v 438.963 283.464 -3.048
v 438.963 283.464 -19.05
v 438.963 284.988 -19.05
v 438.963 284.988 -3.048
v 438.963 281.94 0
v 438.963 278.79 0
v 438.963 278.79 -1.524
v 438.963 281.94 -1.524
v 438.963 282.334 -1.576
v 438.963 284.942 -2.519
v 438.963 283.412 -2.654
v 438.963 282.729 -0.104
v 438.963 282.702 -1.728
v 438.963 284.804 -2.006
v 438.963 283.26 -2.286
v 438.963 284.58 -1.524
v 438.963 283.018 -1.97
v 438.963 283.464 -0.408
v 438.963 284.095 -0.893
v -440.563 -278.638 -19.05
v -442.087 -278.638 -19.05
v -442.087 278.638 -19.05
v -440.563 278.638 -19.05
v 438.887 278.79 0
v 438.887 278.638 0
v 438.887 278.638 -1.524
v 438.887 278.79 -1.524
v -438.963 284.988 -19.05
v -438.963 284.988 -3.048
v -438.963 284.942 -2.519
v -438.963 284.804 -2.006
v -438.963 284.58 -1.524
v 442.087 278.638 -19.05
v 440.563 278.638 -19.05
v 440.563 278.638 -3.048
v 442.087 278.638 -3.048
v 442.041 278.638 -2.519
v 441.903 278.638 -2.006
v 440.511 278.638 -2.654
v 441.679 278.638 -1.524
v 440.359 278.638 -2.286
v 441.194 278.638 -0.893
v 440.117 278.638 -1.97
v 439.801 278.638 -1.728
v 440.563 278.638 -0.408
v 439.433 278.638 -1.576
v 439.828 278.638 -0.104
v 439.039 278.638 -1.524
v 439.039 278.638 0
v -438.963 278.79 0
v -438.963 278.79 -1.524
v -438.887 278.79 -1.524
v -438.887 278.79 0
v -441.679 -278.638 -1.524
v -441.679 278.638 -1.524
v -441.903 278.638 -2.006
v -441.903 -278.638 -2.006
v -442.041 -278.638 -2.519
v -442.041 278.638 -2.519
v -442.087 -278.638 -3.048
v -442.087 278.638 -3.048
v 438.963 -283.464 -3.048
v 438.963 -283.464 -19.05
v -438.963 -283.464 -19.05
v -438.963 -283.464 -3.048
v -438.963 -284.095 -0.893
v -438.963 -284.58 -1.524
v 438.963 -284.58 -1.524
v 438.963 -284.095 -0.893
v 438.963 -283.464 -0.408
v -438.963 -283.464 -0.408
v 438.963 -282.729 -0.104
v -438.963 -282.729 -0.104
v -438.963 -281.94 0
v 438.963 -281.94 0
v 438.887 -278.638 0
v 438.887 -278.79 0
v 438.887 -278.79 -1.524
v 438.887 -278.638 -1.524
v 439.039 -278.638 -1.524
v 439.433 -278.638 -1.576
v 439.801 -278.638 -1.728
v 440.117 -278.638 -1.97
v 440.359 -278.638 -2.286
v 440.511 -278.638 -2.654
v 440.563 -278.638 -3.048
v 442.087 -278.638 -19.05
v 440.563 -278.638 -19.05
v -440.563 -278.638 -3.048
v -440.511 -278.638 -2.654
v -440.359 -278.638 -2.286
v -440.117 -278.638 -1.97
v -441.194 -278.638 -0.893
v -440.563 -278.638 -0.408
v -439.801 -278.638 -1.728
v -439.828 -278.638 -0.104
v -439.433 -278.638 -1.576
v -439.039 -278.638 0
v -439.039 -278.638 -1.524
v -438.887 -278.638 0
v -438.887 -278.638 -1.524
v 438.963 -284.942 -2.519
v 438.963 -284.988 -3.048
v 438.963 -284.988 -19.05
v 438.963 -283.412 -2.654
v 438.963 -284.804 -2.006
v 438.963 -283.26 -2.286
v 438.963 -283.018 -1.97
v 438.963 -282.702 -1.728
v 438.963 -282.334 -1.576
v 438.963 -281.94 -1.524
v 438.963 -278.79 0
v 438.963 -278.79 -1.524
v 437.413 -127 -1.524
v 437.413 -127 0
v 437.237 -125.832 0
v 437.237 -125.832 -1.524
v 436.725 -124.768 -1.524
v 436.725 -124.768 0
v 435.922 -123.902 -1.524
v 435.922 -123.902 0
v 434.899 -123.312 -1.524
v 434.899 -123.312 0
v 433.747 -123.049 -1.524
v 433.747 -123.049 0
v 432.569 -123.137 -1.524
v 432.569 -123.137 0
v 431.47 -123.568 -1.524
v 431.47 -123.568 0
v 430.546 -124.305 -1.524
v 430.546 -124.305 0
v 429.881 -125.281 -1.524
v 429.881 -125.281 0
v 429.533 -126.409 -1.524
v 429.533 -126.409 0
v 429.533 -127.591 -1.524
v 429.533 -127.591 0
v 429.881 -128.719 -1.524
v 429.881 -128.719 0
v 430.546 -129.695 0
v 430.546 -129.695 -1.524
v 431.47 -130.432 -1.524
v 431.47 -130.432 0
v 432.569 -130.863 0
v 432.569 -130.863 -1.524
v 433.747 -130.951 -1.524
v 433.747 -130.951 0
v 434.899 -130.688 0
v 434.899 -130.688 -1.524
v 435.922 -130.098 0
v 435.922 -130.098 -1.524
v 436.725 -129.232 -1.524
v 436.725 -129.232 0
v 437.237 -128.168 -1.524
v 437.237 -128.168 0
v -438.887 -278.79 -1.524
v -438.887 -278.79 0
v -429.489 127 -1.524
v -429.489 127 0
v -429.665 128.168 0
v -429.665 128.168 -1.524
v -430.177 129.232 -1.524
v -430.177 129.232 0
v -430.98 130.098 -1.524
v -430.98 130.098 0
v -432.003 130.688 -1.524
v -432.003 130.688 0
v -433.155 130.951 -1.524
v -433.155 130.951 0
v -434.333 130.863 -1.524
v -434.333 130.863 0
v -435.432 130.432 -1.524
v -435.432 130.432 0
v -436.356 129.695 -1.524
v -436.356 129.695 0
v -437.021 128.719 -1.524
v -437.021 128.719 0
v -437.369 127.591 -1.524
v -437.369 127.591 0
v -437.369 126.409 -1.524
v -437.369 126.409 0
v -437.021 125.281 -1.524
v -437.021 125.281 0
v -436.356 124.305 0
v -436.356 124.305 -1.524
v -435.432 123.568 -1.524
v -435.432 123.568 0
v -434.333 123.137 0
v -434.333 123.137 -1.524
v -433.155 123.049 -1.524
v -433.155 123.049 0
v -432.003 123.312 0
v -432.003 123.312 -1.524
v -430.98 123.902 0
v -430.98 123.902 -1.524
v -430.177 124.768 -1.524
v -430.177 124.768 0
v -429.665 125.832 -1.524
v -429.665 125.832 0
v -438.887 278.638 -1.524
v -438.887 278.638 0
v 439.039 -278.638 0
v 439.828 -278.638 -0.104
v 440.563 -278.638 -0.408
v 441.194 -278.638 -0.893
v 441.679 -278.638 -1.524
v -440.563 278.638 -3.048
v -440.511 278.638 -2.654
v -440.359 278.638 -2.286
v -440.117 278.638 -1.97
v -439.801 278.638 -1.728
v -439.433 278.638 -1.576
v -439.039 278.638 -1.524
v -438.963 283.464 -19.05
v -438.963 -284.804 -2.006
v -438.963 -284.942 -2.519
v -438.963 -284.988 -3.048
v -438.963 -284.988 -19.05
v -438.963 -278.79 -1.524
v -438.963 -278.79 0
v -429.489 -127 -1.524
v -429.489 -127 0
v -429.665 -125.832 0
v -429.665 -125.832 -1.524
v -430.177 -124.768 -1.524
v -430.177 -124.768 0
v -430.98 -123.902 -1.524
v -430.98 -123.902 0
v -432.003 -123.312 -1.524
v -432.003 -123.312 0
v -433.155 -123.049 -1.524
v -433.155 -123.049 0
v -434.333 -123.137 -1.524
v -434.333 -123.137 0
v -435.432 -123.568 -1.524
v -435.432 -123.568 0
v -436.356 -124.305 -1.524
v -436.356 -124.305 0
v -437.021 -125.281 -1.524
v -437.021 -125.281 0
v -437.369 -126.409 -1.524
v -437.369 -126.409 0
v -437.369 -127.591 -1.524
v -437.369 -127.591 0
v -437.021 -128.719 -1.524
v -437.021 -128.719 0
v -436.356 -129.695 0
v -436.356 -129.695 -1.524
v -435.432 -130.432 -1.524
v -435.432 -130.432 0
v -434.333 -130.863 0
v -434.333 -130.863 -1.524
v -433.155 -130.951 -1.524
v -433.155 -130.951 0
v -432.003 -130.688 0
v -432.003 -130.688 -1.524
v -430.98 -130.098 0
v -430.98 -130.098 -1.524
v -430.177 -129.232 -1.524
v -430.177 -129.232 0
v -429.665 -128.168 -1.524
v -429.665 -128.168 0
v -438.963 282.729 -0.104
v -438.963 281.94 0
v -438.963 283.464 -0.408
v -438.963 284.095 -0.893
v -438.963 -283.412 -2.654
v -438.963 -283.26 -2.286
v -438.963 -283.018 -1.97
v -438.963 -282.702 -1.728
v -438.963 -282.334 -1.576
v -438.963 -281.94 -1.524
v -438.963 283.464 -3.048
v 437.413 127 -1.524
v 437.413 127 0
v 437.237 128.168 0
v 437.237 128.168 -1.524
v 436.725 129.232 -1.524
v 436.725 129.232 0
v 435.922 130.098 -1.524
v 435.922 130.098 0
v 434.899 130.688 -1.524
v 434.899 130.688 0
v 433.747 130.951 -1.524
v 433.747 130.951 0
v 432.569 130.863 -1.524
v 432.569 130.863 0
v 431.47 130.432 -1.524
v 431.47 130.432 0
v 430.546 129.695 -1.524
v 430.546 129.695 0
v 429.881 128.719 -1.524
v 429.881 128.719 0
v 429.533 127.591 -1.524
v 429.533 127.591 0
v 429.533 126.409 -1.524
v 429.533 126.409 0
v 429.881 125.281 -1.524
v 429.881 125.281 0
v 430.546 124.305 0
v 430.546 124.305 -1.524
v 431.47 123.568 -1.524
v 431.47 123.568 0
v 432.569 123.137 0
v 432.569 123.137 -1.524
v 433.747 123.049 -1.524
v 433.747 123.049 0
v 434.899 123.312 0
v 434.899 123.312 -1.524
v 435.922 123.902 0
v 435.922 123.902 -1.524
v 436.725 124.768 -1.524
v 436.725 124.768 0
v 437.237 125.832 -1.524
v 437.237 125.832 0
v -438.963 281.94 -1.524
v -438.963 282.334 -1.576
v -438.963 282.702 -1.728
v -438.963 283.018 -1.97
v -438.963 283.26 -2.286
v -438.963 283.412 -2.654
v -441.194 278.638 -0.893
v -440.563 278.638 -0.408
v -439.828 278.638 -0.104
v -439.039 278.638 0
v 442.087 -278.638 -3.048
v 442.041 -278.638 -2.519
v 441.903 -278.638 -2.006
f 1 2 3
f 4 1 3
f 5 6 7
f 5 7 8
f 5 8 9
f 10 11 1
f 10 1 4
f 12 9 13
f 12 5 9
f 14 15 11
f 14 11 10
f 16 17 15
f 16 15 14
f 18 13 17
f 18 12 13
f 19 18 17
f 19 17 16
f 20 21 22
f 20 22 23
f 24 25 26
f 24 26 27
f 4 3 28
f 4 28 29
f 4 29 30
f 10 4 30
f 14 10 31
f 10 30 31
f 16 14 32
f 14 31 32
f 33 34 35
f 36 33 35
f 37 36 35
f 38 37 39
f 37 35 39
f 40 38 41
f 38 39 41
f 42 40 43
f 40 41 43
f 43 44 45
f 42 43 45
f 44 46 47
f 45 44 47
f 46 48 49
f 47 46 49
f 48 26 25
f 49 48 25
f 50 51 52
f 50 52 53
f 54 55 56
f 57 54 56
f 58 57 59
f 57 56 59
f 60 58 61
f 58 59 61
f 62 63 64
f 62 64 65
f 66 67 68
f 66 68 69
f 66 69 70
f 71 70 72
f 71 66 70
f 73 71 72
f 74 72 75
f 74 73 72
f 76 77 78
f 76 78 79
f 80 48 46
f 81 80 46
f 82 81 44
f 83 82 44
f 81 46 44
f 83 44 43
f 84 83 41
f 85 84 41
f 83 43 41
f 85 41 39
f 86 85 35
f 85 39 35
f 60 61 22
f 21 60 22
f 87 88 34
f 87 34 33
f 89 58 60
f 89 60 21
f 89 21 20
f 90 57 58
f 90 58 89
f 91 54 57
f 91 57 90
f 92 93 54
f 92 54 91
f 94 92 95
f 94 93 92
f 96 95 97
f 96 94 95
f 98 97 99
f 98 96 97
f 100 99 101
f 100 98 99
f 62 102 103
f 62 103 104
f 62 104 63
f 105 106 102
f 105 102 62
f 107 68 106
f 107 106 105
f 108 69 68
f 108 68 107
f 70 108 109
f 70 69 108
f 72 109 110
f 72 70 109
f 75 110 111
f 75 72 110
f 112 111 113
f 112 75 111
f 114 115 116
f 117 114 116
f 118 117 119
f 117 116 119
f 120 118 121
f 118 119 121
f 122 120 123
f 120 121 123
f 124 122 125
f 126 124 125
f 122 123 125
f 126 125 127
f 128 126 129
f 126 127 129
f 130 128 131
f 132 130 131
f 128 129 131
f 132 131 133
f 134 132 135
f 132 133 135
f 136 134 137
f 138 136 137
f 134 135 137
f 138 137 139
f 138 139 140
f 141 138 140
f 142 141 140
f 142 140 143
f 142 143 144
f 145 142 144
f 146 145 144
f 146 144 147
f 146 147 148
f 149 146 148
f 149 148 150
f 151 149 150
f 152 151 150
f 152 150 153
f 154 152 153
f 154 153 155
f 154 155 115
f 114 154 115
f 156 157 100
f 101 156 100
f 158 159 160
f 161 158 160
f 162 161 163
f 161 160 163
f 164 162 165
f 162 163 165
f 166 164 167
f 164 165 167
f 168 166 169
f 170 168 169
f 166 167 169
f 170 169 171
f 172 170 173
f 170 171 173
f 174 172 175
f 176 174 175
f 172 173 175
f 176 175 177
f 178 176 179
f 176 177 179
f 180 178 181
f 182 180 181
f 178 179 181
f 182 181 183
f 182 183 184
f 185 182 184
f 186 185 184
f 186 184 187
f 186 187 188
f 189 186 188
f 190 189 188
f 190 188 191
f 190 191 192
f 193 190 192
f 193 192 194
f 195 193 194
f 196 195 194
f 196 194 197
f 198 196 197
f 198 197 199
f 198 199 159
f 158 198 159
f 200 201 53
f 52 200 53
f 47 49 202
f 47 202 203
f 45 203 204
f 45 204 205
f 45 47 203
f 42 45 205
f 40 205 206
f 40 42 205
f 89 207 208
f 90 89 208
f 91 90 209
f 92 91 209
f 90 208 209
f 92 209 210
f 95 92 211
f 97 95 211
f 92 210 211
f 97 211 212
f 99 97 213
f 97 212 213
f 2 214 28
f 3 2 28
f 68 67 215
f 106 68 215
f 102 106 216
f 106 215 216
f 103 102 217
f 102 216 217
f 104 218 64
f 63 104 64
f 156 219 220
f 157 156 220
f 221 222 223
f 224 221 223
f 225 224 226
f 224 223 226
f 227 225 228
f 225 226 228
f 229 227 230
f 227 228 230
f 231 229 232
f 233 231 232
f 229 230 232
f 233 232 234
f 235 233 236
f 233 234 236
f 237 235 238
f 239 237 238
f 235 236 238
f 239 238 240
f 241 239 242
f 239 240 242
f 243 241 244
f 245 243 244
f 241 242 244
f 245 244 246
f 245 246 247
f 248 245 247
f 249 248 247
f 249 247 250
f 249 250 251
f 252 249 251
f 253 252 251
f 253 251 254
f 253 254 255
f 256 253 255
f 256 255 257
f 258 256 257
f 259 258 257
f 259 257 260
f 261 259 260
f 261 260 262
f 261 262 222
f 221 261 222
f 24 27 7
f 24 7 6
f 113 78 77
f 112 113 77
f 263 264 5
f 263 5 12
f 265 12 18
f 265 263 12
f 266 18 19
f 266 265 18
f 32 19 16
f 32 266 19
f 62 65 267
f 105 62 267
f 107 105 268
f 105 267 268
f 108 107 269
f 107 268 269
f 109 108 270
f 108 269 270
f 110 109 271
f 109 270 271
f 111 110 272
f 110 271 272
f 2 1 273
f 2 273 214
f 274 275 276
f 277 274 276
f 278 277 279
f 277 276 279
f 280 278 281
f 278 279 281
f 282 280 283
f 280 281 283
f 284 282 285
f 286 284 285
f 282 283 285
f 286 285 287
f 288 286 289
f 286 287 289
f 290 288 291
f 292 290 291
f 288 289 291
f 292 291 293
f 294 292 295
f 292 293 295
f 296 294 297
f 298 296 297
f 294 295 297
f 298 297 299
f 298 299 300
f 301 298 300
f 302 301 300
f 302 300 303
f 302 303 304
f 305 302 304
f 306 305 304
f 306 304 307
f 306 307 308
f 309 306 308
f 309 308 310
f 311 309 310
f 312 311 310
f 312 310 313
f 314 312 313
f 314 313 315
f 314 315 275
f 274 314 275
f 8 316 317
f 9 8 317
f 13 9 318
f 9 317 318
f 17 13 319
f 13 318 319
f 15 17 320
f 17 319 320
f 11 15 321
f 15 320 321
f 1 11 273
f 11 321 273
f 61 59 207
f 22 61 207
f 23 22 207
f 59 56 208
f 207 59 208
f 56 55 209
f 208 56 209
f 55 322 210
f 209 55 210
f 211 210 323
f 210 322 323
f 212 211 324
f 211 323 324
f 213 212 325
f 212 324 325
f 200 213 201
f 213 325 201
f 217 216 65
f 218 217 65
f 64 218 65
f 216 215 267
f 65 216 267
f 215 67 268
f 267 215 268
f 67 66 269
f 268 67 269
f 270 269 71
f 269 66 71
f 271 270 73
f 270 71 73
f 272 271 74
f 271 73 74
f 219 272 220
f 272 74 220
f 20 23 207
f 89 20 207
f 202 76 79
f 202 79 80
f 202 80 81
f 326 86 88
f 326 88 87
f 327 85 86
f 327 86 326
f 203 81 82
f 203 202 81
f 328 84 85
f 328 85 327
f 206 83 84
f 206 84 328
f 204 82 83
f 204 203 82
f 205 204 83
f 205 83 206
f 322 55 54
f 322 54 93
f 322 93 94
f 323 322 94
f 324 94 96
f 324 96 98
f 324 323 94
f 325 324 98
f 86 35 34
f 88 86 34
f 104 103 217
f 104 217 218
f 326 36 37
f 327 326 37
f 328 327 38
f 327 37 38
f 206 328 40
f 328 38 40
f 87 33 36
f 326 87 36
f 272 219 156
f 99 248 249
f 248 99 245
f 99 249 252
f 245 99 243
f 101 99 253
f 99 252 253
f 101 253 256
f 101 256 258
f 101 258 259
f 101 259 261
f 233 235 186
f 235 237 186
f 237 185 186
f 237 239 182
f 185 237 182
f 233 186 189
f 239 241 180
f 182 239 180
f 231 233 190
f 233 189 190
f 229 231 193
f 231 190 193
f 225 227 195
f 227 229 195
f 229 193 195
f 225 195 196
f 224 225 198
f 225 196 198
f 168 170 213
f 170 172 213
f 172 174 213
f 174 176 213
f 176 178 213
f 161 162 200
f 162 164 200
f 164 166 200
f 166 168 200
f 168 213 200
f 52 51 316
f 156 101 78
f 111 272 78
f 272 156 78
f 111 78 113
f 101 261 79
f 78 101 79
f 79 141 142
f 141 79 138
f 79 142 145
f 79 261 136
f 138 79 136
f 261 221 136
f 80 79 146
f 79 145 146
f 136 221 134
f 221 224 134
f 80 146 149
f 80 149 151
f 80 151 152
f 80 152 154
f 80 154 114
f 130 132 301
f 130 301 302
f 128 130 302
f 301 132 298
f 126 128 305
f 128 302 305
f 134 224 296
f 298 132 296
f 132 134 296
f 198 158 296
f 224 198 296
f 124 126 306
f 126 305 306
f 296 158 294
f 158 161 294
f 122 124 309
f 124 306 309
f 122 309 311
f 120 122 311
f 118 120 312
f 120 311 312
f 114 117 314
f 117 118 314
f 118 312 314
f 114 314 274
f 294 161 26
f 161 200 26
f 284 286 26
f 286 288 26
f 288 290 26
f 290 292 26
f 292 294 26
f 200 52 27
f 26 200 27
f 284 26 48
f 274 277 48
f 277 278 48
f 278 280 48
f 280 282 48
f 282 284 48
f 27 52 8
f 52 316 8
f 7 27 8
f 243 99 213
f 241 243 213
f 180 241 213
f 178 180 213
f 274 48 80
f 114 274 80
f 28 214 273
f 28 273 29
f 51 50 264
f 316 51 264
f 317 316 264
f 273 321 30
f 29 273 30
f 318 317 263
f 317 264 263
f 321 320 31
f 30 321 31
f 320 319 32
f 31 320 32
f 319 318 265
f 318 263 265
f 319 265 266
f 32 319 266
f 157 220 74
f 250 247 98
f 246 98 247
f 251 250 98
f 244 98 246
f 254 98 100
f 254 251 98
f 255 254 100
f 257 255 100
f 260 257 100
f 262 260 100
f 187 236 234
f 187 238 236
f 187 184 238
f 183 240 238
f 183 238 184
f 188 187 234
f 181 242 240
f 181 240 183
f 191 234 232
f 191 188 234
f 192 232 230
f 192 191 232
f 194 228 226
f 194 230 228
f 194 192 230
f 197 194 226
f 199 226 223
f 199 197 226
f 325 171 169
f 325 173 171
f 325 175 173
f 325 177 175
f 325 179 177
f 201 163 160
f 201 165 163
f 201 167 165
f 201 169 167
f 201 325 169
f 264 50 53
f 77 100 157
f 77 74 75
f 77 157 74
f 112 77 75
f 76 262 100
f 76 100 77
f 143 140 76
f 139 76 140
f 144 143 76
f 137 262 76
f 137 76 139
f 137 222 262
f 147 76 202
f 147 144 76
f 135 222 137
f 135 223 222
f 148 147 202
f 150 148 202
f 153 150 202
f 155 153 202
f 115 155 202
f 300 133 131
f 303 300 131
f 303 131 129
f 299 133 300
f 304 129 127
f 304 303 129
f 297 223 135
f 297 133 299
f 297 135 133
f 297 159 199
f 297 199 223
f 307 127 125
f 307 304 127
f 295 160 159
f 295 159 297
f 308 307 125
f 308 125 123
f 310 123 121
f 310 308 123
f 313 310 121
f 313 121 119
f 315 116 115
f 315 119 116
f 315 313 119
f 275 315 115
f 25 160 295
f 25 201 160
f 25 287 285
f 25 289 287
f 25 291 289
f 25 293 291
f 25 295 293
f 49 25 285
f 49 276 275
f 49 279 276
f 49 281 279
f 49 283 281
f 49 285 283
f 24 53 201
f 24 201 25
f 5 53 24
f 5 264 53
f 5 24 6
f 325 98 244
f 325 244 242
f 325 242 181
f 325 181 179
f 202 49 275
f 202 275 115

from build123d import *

# Parameters (mm, degrees)
CROQUIS1_W                   = 884.174
CROQUIS1_H                   = 569.976
BRIDA_BASE1_DEPTH            = 1.524
CROQUIS6_W                   = 3.1242
CROQUIS6_H                   = 6.35
CORTAR_EXTRUIR1_DEPTH        = 526.986119863
BRIDA_START                  = -438.9628
BRIDA_DE_ARISTA1_DEPTH       = 877.9256
BRIDA_START_2                = 6.35
BRIDA_DE_ARISTA1_2_DEPTH     = 557.276
BRIDA_DE_ARISTA1_3_DEPTH     = 877.9256
BRIDA_DE_ARISTA1_4_OUTLINE_W = 0.1524
BRIDA_DE_ARISTA1_4_OUTLINE_H = 1.524
BRIDA_DE_ARISTA1_4_DEPTH     = 0.0762
BRIDA_START_3                = 438.8866
BRIDA_DE_ARISTA1_5_OUTLINE_W = 0.1524
BRIDA_DE_ARISTA1_5_OUTLINE_H = 1.524
BRIDA_DE_ARISTA1_5_DEPTH     = 0.0762
BRIDA_DE_ARISTA1_6_DEPTH     = 557.276
CROQUIS19_R                  = 3.9624
CORTAR_EXTRUIR2_DEPTH        = 527.328773879


# Read off the part's stored shape, not the designer's step: Brida de arista1
# Sheet-metal steps are written as plain solids
with BuildPart() as part:
    # Croquis1 → Brida base1 (new body)
    with BuildSketch(Plane.XY):
        Rectangle(CROQUIS1_W, CROQUIS1_H)
    extrude(amount=-BRIDA_BASE1_DEPTH)

    # Croquis6 → Cortar-Extruir1 (cut, through all)
    with BuildSketch(Plane.XY):
        with Locations((440.5249, 281.813)):
            Rectangle(CROQUIS6_W, CROQUIS6_H)
        with Locations((-440.5249, 281.813)):
            Rectangle(CROQUIS6_W, CROQUIS6_H)
        with Locations((-440.5249, -281.813)):
            Rectangle(CROQUIS6_W, CROQUIS6_H)
        with Locations((440.5249, -281.813)):
            Rectangle(CROQUIS6_W, CROQUIS6_H)
    extrude(amount=-CORTAR_EXTRUIR1_DEPTH, mode=Mode.SUBTRACT)

    # Brida de arista1 outline → Brida de arista1 (add)
    with BuildSketch(Plane.YZ.offset(BRIDA_START)):
        with BuildLine():
            Line((284.988, -19.05), (284.988, -3.048))
            ThreePointArc((284.988, -3.048), (284.884141918, -2.259119551), (284.579645431, -1.524))
            Line((284.579645431, -1.524), (281.94, -1.524))
            ThreePointArc((281.94, -1.524), (283.017630735, -1.970369265), (283.464, -3.048))
            Line((283.464, -3.048), (283.464, -19.05))
            Line((283.464, -19.05), (284.988, -19.05))
        make_face()
        with BuildLine():
            ThreePointArc((-283.464, -3.048), (-283.017630735, -1.970369265), (-281.94, -1.524))
            Line((-281.94, -1.524), (-284.579645431, -1.524))
            ThreePointArc((-284.579645431, -1.524), (-284.884141918, -2.259119551), (-284.988, -3.048))
            Line((-284.988, -3.048), (-284.988, -19.05))
            Line((-284.988, -19.05), (-283.464, -19.05))
            Line((-283.464, -19.05), (-283.464, -3.048))
        make_face()
    extrude(amount=BRIDA_DE_ARISTA1_DEPTH)

    # Brida de arista1 2 outline → Brida de arista1 2 (add)
    with BuildSketch(Plane(origin=(0, 284.988, -1.524), x_dir=(-1, 0, 0), z_dir=(0, -1, 0)).offset(BRIDA_START_2)):
        with BuildLine():
            Line((-440.563, 1.524), (-440.563, 17.526))
            Line((-440.563, 17.526), (-442.087, 17.526))
            Line((-442.087, 17.526), (-442.087, 1.524))
            ThreePointArc((-442.087, 1.524), (-441.983141918, 0.735119551), (-441.678645431, 0))
            Line((-441.678645431, 0), (-439.039, 0))
            ThreePointArc((-439.039, 0), (-440.116630735, 0.446369265), (-440.563, 1.524))
        make_face()
        with BuildLine():
            ThreePointArc((440.563, 1.524), (440.116630735, 0.446369265), (439.039, 0))
            Line((439.039, 0), (441.678645431, 0))
            ThreePointArc((441.678645431, 0), (441.983141918, 0.735119551), (442.087, 1.524))
            Line((442.087, 1.524), (442.087, 17.526))
            Line((442.087, 17.526), (440.563, 17.526))
            Line((440.563, 17.526), (440.563, 1.524))
        make_face()
    extrude(amount=BRIDA_DE_ARISTA1_2_DEPTH)

    # Brida de arista1 3 outline → Brida de arista1 3 (cut)
    with BuildSketch(Plane.YZ.offset(BRIDA_START)):
        with BuildLine():
            ThreePointArc((281.94, 0), (283.464, -0.408354569), (284.579645431, -1.524))
            Line((284.579645431, -1.524), (284.988, -1.524))
            Line((284.988, -1.524), (284.988, 0))
            Line((284.988, 0), (281.94, 0))
        make_face()
        with BuildLine():
            ThreePointArc((-284.579645431, -1.524), (-283.464, -0.408354569), (-281.94, 0))
            Line((-281.94, 0), (-284.988, 0))
            Line((-284.988, 0), (-284.988, -1.524))
            Line((-284.988, -1.524), (-284.579645431, -1.524))
        make_face()
    extrude(amount=BRIDA_DE_ARISTA1_3_DEPTH, mode=Mode.SUBTRACT)

    # Brida de arista1 4 outline → Brida de arista1 4 (cut)
    with BuildSketch(Plane.YZ.offset(BRIDA_START)):
        with Locations((278.7142, -0.762)):
            Rectangle(BRIDA_DE_ARISTA1_4_OUTLINE_W, BRIDA_DE_ARISTA1_4_OUTLINE_H)
        with Locations((-278.7142, -0.762)):
            Rectangle(BRIDA_DE_ARISTA1_4_OUTLINE_W, BRIDA_DE_ARISTA1_4_OUTLINE_H)
    extrude(amount=BRIDA_DE_ARISTA1_4_DEPTH, mode=Mode.SUBTRACT)

    # Brida de arista1 5 outline → Brida de arista1 5 (cut)
    with BuildSketch(Plane.YZ.offset(BRIDA_START_3)):
        with Locations((278.7142, -0.762)):
            Rectangle(BRIDA_DE_ARISTA1_5_OUTLINE_W, BRIDA_DE_ARISTA1_5_OUTLINE_H)
        with Locations((-278.7142, -0.762)):
            Rectangle(BRIDA_DE_ARISTA1_5_OUTLINE_W, BRIDA_DE_ARISTA1_5_OUTLINE_H)
    extrude(amount=BRIDA_DE_ARISTA1_5_DEPTH, mode=Mode.SUBTRACT)

    # Brida de arista1 6 outline → Brida de arista1 6 (cut)
    with BuildSketch(Plane(origin=(0, 284.988, -1.524), x_dir=(-1, 0, 0), z_dir=(0, -1, 0)).offset(BRIDA_START_2)):
        with BuildLine():
            ThreePointArc((-439.039, -1.524), (-440.563, -1.115645431), (-441.678645431, 0))
            Line((-441.678645431, 0), (-442.087, 0))
            Line((-442.087, 0), (-442.087, -1.524))
            Line((-442.087, -1.524), (-439.039, -1.524))
        make_face()
        with BuildLine():
            Line((442.087, 0), (441.678645431, 0))
            ThreePointArc((441.678645431, 0), (440.563, -1.115645431), (439.039, -1.524))
            Line((439.039, -1.524), (442.087, -1.524))
            Line((442.087, -1.524), (442.087, 0))
        make_face()
    extrude(amount=BRIDA_DE_ARISTA1_6_DEPTH, mode=Mode.SUBTRACT)

    # Croquis19 → Cortar-Extruir2 (cut, through all)
    with BuildSketch(Plane.XY):
        with Locations((-433.451, 127)):
            Circle(CROQUIS19_R)
        with Locations((-433.451, -127)):
            Circle(CROQUIS19_R)
        with Locations((433.451, 127)):
            Circle(CROQUIS19_R)
        with Locations((433.451, -127)):
            Circle(CROQUIS19_R)
    extrude(amount=-CORTAR_EXTRUIR2_DEPTH, mode=Mode.SUBTRACT)


solid = part.part
